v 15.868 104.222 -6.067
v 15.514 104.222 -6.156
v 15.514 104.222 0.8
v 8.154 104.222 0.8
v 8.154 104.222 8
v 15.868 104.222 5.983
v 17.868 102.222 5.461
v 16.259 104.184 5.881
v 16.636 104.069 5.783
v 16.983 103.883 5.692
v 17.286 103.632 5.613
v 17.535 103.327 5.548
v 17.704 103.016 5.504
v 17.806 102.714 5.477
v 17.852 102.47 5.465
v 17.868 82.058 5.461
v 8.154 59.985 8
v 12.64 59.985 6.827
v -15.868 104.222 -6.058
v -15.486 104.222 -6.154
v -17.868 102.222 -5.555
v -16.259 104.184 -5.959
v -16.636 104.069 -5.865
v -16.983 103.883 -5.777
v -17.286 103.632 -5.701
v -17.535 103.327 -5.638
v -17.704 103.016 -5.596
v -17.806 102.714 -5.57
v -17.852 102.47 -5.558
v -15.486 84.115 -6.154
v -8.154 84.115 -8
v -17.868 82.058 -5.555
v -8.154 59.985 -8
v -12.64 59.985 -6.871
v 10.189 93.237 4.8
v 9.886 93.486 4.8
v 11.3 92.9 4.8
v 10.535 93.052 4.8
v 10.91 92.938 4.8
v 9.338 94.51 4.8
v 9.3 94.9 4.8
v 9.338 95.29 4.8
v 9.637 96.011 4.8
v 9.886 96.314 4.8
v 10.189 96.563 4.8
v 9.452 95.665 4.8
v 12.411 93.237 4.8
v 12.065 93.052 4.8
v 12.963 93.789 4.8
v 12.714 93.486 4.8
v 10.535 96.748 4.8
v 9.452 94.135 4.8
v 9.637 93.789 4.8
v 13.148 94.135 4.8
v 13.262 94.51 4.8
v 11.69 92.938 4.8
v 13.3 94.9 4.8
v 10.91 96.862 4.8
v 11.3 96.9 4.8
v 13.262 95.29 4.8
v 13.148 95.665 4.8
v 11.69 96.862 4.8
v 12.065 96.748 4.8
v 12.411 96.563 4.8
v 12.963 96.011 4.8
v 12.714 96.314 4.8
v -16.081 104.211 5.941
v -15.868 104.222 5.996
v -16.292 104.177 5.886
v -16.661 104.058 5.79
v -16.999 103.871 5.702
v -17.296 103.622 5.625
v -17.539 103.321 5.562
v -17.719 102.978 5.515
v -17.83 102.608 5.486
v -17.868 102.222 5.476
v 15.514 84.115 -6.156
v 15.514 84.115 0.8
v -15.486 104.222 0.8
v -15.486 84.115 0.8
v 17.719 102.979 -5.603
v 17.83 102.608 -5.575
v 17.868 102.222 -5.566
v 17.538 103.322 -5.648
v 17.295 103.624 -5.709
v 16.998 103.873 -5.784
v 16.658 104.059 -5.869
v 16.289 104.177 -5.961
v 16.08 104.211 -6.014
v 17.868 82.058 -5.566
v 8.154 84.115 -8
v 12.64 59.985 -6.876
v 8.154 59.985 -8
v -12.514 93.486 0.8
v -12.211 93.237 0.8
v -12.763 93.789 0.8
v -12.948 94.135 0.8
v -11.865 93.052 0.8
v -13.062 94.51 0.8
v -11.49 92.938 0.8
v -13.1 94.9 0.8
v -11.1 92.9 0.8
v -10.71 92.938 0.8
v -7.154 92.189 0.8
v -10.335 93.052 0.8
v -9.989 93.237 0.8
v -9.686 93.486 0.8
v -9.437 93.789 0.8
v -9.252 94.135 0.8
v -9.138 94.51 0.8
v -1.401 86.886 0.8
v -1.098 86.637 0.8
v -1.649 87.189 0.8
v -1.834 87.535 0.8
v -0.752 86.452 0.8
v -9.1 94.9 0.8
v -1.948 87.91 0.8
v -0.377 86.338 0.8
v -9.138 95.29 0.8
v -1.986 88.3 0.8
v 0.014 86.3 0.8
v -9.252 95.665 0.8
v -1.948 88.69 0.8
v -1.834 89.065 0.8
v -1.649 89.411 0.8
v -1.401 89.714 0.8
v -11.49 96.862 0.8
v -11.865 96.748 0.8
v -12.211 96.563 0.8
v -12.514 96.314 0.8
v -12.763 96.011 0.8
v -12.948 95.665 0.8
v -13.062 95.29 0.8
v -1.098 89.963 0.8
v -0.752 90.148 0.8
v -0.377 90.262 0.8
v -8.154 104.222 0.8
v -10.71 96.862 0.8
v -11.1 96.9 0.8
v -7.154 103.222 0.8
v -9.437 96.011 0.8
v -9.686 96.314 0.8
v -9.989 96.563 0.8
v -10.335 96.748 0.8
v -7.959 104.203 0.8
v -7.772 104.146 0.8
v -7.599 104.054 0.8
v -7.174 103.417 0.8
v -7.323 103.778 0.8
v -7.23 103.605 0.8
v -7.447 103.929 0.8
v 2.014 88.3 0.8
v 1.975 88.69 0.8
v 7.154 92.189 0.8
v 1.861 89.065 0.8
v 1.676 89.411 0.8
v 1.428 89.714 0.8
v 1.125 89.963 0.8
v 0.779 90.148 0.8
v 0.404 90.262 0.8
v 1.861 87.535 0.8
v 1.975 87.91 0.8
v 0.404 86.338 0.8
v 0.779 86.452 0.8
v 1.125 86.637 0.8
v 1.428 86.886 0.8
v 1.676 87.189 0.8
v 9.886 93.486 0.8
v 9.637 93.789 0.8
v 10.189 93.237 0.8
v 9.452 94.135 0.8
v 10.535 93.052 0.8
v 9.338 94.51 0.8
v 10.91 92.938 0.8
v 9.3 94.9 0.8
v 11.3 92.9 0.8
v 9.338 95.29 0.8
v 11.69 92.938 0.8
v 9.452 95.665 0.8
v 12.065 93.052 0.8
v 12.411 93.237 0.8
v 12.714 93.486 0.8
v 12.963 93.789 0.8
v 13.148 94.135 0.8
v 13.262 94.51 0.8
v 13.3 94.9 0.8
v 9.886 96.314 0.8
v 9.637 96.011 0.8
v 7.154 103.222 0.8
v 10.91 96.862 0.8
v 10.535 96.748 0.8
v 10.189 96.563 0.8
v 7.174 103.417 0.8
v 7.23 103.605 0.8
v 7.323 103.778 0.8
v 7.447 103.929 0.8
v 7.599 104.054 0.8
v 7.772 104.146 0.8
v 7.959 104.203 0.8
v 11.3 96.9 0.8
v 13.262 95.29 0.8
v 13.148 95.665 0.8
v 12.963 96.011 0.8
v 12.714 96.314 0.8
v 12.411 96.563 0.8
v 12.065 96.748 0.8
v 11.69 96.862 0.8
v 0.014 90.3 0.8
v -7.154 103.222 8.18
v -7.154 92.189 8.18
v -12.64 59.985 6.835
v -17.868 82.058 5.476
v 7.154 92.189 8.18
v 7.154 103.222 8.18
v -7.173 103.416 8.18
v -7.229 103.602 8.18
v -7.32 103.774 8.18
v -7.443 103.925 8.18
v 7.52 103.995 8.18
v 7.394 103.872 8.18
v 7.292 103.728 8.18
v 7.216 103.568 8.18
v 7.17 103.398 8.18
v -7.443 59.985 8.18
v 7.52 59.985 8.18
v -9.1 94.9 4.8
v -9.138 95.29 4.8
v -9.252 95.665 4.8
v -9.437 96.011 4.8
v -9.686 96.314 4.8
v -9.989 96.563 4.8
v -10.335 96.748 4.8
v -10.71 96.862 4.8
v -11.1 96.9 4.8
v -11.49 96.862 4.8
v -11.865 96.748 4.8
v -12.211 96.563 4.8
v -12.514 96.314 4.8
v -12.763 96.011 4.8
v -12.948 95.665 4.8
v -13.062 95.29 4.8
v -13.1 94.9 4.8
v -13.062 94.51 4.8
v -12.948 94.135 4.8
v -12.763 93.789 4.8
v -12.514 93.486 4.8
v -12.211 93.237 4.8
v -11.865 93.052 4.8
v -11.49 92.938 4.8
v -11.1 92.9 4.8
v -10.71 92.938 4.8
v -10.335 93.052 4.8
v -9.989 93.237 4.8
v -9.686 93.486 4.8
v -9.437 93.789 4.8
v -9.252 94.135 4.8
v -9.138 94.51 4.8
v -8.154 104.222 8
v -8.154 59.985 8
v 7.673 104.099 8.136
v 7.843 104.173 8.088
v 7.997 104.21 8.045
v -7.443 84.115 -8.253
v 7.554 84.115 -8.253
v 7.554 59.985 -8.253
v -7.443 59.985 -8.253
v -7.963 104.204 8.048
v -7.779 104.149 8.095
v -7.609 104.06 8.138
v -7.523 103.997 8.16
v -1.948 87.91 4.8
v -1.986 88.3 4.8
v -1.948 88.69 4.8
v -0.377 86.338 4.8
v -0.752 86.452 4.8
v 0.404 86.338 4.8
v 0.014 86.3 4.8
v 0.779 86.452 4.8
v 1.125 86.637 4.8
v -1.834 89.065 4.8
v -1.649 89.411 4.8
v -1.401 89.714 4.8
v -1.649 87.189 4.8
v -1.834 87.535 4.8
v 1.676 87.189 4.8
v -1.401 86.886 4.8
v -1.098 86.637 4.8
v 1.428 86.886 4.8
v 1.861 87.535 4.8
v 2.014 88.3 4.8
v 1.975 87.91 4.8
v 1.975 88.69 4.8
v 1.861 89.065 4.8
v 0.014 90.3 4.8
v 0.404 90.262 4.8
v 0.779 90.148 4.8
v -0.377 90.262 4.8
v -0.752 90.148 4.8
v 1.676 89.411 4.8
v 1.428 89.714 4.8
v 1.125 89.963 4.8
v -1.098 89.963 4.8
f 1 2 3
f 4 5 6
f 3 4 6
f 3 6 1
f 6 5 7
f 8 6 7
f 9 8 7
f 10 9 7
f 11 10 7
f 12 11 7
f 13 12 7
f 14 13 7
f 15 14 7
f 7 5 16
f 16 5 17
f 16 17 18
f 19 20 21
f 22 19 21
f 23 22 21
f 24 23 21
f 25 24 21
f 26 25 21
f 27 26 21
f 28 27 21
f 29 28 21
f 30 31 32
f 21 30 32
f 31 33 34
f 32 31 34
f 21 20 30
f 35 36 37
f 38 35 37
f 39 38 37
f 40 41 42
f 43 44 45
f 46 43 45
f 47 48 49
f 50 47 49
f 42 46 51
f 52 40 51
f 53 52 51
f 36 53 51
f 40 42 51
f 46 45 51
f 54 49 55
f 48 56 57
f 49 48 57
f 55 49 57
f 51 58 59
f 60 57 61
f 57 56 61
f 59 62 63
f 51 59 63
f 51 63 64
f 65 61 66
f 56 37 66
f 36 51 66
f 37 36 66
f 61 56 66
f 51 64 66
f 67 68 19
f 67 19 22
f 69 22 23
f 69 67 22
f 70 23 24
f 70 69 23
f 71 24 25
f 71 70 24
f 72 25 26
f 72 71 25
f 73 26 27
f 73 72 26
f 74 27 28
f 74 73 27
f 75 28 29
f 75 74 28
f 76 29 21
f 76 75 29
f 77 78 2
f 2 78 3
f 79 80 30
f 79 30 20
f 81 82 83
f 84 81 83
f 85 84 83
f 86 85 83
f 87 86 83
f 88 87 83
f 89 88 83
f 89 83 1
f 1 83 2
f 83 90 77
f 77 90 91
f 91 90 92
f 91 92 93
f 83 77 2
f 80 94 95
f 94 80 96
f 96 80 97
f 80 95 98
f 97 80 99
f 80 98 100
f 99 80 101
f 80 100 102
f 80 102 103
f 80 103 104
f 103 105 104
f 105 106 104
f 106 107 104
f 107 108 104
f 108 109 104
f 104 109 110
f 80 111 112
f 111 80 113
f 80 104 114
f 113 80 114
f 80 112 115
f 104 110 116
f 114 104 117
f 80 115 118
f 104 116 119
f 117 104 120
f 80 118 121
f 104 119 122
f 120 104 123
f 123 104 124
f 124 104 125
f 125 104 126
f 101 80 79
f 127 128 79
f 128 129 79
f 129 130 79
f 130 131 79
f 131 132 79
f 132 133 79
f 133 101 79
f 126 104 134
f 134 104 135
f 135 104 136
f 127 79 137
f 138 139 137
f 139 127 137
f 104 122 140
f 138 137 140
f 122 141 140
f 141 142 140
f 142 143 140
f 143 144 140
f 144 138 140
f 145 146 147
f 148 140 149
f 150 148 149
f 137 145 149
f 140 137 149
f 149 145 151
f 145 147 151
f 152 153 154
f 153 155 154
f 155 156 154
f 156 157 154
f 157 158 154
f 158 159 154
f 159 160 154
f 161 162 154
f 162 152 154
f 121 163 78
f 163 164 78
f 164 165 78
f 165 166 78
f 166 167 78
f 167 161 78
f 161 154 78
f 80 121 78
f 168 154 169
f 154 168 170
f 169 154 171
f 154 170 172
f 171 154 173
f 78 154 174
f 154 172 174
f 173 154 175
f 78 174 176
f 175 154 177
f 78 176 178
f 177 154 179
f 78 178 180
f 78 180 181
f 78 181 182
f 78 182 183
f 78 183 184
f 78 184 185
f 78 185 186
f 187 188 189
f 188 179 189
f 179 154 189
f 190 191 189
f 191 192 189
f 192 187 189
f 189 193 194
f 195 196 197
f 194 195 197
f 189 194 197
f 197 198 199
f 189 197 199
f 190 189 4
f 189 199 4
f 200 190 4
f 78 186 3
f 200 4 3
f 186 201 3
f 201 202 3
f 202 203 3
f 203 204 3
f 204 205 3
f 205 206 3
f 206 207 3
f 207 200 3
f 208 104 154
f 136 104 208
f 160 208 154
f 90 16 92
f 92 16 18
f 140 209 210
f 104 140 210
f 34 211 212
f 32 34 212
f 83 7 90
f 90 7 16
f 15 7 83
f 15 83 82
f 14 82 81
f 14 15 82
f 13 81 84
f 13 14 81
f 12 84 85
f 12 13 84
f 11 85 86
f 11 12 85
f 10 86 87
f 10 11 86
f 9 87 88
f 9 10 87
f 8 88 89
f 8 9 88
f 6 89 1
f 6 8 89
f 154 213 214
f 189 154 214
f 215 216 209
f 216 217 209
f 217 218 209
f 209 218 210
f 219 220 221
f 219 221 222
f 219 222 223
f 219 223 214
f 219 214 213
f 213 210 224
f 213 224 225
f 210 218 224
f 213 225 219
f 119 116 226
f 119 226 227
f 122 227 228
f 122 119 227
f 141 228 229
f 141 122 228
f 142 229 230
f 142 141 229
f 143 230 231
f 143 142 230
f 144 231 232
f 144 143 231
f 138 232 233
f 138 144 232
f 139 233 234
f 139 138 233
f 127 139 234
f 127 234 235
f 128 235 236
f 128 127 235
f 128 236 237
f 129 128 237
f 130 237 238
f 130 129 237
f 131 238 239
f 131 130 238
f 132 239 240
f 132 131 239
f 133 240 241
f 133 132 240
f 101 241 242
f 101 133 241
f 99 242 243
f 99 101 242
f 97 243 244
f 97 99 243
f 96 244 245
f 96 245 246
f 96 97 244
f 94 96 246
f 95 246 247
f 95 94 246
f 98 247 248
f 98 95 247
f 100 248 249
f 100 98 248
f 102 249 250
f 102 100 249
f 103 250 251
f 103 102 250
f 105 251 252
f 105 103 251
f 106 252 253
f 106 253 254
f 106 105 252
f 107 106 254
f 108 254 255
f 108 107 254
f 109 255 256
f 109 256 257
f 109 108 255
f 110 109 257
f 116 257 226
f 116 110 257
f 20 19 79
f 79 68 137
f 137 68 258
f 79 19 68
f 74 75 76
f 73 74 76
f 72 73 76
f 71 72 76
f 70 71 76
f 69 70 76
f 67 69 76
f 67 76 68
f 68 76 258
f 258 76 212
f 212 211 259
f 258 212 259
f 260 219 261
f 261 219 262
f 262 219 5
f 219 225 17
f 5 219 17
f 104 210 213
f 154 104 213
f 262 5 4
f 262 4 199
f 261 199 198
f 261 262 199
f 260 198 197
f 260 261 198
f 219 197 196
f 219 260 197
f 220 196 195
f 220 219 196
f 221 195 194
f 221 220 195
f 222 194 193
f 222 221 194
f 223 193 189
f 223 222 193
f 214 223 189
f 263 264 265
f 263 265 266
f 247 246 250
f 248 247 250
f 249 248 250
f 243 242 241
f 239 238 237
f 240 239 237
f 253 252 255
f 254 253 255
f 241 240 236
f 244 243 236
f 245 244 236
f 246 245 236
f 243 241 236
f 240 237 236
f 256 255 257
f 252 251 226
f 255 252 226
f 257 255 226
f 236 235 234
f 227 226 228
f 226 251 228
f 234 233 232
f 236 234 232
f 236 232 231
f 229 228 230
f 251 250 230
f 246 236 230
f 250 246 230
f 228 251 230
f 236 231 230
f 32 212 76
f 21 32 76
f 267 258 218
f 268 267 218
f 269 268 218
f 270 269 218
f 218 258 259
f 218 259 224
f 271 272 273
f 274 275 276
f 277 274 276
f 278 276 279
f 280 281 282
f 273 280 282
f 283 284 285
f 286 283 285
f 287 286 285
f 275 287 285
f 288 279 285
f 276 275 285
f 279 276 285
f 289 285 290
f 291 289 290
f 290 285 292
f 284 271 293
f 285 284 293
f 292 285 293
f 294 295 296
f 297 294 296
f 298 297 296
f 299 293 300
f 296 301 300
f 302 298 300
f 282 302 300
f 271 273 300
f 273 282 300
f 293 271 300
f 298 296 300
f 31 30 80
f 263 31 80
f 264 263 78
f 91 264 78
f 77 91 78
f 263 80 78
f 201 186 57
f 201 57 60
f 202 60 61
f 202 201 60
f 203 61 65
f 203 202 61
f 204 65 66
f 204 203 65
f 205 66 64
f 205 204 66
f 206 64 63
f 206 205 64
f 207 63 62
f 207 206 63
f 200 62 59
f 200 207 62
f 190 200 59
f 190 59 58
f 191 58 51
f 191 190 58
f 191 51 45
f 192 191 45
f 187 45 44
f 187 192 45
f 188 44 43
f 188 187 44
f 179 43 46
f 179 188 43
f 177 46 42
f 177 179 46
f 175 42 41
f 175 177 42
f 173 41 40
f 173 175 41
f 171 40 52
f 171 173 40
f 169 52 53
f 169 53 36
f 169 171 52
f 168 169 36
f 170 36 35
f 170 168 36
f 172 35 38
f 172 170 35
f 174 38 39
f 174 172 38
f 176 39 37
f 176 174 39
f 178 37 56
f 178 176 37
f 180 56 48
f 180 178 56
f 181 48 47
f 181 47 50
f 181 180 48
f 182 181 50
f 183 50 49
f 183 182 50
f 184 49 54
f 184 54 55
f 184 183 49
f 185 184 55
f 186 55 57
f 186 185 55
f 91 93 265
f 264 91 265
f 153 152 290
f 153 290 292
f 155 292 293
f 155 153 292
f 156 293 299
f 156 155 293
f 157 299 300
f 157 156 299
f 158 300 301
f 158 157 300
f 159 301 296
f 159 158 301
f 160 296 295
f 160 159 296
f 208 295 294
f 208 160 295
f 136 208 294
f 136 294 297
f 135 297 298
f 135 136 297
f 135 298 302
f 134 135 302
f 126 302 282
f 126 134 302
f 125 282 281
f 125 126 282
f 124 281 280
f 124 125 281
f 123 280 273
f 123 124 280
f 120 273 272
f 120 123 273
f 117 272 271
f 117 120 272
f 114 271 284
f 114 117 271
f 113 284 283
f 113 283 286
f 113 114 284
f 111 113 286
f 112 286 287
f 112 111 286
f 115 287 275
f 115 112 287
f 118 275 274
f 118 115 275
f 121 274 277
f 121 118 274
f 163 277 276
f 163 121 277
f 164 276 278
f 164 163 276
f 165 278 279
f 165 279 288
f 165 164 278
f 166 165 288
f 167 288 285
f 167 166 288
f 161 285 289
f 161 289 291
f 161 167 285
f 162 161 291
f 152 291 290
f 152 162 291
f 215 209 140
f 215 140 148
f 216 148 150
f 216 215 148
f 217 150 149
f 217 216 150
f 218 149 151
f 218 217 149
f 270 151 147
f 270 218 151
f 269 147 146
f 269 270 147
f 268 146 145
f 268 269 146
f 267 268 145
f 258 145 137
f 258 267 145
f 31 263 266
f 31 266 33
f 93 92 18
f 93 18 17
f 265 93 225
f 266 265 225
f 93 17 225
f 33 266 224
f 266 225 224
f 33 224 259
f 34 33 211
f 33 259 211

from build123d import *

# Parameters (mm, degrees)
PAD_DEPTH       = 12
POCKET_DEPTH    = 62
SKETCH019_W     = 31
SKETCH019_H     = 21.780884
POCKET002_DEPTH = 17
SKETCH020_R     = 2
POCKET003_DEPTH = 4


with BuildPart() as part:
    # Sketch010 → Pad (new body, symmetric)
    with BuildSketch(Plane.XY):
        with BuildLine():
            Line((12.639868, 59.984547), (-12.639868, 59.984547))
            Line((-12.639868, 59.984547), (-17.867889, 82.058411))
            Line((-17.867889, 82.058411), (-17.867889, 102.222236))
            ThreePointArc((-15.867889, 104.222236), (-17.282103, 103.63645), (-17.867889, 102.222236))
            Line((-15.867889, 104.222236), (-8.154342, 104.222236))
            ThreePointArc((-7.154342, 103.222236), (-7.447235, 103.929343), (-8.154342, 104.222236))
            Line((-7.154342, 103.222236), (-7.154342, 92.189331))
            Line((-7.154342, 92.189331), (7.154342, 92.189331))
            Line((7.154342, 92.189331), (7.154342, 103.222236))
            ThreePointArc((8.154342, 104.222236), (7.447235, 103.929343), (7.154342, 103.222236))
            Line((8.154342, 104.222236), (15.867889, 104.222236))
            ThreePointArc((17.867889, 102.222236), (17.282103, 103.63645), (15.867889, 104.222236))
            Line((17.867889, 102.222236), (17.867889, 82.058411))
            Line((17.867889, 82.058411), (12.639868, 59.984547))
        make_face()
    extrude(amount=PAD_DEPTH, both=True)

    # Sketch011 → Pocket (cut)
    with BuildSketch(Plane.XZ.offset(-54)):
        Polygon((0, 13.813917), (-22.117895, 13.813917), (-22.117895, -0.189388), (-22.117895, -17.743416), (0, -17.743416), (22.658901, -17.743416), (22.658901, -0.111897), (22.658901, 13.813917), align=None)
        Polygon((-18.596464, 0), (-18.596464, 5.287208), (-8.154342, 8), (-7.443202, 8.179805), (0, 8.179805), (7.519913, 8.179805), (8.154342, 8), (18.531284, 5.287208), (18.531284, -0.112287), (18.531284, -5.399495), (8.154342, -8), (7.554242, -8.253323), (0.11104, -8.253323), (-7.443202, -8.253323), (-8.154342, -8), (-18.596464, -5.371119), align=None, mode=Mode.SUBTRACT)
    extrude(amount=-POCKET_DEPTH, mode=Mode.SUBTRACT)

    # Sketch019 → Pocket002 (cut)
    with BuildSketch(Plane.XY.offset(0.8)):
        with Locations((0.01352, 95.005211)):
            Rectangle(SKETCH019_W, SKETCH019_H)
    extrude(amount=-POCKET002_DEPTH, mode=Mode.SUBTRACT)

    # Sketch020 → Pocket003 (cut)
    with BuildSketch(Plane.XY.offset(0.8)):
        with Locations((-11.1, 94.9)):
            Circle(SKETCH020_R)
        with Locations((11.3, 94.9)):
            Circle(SKETCH020_R)
        with Locations((0.013518, 88.3)):
            Circle(SKETCH020_R)
    extrude(amount=POCKET003_DEPTH, mode=Mode.SUBTRACT)


solid = part.part
